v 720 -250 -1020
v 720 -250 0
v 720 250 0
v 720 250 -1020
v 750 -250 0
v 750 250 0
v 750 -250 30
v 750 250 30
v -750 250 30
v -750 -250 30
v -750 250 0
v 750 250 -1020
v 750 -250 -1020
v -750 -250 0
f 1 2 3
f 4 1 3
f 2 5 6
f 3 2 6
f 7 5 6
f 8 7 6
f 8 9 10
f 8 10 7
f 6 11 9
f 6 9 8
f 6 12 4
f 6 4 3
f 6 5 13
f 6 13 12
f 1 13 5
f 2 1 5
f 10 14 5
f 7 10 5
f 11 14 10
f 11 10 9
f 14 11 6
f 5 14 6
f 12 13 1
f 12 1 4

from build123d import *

# Parameters (mm, degrees)
F0_W     = 1500
F0_H     = 500
F1_DEPTH = 30
F2_W     = 500
F2_H     = 1020
F3_DEPTH = 30


with BuildPart() as f1:
    # F0 (on Top) → F1 (new body)
    with BuildSketch(Plane.XY):
        Rectangle(F0_W, F0_H)
    extrude(amount=F1_DEPTH)


with BuildPart() as f3:
    # F2 (on face) → F3 (new body)
    with BuildSketch(Plane.YZ.offset(750)):
        with Locations((0, -510)):
            Rectangle(F2_W, F2_H)
    extrude(amount=-F3_DEPTH)


solid = Compound([f1.part, f3.part])
